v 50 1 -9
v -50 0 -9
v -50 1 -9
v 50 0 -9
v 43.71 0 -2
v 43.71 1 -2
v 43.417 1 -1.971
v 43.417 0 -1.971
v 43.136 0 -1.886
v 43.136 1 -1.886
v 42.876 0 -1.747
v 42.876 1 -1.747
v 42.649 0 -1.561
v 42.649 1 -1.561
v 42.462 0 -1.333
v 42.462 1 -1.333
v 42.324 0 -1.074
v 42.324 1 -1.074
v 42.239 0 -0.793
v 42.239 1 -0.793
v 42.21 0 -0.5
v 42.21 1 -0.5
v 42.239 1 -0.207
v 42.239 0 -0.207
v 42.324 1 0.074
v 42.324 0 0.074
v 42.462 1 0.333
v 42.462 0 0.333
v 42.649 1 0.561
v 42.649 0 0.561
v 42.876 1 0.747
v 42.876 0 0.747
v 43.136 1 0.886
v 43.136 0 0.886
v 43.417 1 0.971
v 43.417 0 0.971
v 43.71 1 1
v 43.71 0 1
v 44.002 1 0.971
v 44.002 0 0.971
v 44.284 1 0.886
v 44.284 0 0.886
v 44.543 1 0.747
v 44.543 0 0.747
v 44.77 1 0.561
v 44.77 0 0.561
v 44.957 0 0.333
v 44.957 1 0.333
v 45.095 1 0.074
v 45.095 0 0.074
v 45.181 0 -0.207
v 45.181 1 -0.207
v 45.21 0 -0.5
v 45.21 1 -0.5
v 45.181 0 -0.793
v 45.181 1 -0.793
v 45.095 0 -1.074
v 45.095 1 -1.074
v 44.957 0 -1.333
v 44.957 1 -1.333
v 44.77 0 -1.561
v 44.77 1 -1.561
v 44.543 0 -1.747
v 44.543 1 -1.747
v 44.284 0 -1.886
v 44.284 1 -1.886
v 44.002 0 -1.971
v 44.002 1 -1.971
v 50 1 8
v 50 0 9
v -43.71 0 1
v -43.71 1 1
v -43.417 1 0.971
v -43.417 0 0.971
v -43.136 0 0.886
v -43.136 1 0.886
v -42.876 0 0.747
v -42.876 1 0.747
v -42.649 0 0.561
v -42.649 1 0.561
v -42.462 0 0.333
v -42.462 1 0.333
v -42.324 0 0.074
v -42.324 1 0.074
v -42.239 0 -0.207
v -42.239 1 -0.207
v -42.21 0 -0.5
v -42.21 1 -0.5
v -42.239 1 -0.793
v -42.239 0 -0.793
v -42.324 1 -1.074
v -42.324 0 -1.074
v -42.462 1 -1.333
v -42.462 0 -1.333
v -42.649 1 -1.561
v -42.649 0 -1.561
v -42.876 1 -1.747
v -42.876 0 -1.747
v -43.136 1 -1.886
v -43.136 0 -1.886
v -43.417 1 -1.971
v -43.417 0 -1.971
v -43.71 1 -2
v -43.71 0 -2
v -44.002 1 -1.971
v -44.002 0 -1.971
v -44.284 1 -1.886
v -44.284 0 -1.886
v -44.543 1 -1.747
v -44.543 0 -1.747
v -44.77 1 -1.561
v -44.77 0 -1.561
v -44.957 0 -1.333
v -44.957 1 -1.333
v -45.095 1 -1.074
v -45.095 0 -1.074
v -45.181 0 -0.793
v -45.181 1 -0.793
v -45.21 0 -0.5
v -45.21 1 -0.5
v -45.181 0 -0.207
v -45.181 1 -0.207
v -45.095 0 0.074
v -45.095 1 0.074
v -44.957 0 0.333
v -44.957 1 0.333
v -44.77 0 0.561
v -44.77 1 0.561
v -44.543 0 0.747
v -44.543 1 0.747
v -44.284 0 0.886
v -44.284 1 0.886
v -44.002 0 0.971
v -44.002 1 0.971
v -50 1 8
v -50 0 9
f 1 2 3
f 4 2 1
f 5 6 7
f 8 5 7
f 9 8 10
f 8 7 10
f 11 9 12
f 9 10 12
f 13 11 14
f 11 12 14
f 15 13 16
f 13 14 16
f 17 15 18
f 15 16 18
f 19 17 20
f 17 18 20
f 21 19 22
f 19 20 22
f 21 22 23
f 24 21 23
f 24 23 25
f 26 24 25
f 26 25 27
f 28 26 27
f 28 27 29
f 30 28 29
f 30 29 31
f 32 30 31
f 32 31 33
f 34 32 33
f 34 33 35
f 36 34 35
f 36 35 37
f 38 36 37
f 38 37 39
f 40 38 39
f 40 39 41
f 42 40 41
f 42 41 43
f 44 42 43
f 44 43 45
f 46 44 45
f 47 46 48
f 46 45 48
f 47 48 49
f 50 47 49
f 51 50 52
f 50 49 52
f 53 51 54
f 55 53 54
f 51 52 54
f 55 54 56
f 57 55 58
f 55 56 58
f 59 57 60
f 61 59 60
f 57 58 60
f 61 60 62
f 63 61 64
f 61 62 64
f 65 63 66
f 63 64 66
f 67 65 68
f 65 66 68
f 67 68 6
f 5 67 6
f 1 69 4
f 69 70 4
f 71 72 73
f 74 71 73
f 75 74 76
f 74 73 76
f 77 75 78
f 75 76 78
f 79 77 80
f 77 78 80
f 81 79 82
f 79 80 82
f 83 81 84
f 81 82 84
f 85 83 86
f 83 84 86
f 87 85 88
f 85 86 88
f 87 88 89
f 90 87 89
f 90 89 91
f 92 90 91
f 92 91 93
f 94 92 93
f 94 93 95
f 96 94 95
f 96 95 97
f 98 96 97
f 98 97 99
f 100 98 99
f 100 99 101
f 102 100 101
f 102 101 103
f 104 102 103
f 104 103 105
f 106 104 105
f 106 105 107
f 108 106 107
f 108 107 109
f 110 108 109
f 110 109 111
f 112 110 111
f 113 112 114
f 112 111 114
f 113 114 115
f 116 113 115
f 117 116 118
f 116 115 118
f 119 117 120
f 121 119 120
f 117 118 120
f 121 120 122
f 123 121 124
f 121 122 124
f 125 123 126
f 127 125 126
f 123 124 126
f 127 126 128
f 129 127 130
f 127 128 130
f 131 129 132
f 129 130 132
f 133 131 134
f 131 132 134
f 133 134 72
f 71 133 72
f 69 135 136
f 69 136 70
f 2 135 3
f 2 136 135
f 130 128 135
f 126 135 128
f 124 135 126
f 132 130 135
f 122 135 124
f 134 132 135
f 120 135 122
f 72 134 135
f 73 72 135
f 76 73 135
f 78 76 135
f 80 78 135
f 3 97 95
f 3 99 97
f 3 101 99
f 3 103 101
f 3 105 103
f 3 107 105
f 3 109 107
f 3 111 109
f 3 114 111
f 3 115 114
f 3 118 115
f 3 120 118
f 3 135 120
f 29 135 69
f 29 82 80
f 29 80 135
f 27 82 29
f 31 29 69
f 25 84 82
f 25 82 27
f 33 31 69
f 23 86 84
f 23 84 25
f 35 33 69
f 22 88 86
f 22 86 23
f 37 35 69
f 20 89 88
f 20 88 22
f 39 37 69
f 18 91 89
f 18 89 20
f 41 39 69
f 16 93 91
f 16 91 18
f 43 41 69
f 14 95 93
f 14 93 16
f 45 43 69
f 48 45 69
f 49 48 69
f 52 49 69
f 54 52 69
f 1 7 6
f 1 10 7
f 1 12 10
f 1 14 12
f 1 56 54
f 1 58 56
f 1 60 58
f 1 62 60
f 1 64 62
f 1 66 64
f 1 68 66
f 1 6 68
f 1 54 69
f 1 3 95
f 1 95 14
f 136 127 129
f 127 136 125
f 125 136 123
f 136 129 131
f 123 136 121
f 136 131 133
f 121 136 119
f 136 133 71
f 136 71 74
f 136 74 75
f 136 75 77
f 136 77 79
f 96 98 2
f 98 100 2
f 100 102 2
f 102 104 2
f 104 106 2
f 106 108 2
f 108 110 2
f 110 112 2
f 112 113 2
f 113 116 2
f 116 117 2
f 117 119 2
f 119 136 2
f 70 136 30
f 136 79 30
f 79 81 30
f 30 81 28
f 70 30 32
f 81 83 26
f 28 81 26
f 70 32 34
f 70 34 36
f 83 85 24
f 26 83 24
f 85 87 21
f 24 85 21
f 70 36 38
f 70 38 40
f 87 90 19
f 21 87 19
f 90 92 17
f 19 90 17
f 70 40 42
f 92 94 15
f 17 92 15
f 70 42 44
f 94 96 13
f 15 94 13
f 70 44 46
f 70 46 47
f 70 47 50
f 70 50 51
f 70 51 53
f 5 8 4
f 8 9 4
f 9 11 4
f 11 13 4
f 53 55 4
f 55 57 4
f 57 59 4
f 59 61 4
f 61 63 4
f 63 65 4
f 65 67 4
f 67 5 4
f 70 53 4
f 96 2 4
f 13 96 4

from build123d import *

# Parameters (mm, degrees)
SKETCH_1_W          = 100
SKETCH_1_H          = 18
EXTRUDE_1_DEPTH     = 1
CHAMFER_1_SIZE      = 1
SKETCH_3_R          = 1.5
CUT_EXTRUDE_2_DEPTH = 20


with BuildPart() as part:
    # Эскиз1 → Бобышка-Вытянуть1 (new body)
    with BuildSketch(Plane(origin=(0, 0, 0), x_dir=(1, 0, 0), z_dir=(0, 1, 0))):
        Rectangle(SKETCH_1_W, SKETCH_1_H)
    extrude(amount=EXTRUDE_1_DEPTH)

    # Фаска1
    chamfer_1_edges = [part.edges().sort_by_distance(p)[0] for p in [
        (0, 1, 9),
    ]]
    chamfer(chamfer_1_edges, length=CHAMFER_1_SIZE - 0.0001)  # a hair under: the kernel refuses the full size

    # Эскиз3 → Вырез-Вытянуть2 (cut)
    with BuildSketch(Plane(origin=(0, 1, 0), x_dir=(1, 0, 0), z_dir=(0, 1, 0))):
        with Locations(Location((-43.709679881, 0.5, 0), (0, 0, 270))):
            Circle(SKETCH_3_R)
        with Locations(Location((43.709679881, 0.5, 0), (0, 0, 90))):
            Circle(SKETCH_3_R)
    extrude(amount=-CUT_EXTRUDE_2_DEPTH, mode=Mode.SUBTRACT)


solid = part.part
